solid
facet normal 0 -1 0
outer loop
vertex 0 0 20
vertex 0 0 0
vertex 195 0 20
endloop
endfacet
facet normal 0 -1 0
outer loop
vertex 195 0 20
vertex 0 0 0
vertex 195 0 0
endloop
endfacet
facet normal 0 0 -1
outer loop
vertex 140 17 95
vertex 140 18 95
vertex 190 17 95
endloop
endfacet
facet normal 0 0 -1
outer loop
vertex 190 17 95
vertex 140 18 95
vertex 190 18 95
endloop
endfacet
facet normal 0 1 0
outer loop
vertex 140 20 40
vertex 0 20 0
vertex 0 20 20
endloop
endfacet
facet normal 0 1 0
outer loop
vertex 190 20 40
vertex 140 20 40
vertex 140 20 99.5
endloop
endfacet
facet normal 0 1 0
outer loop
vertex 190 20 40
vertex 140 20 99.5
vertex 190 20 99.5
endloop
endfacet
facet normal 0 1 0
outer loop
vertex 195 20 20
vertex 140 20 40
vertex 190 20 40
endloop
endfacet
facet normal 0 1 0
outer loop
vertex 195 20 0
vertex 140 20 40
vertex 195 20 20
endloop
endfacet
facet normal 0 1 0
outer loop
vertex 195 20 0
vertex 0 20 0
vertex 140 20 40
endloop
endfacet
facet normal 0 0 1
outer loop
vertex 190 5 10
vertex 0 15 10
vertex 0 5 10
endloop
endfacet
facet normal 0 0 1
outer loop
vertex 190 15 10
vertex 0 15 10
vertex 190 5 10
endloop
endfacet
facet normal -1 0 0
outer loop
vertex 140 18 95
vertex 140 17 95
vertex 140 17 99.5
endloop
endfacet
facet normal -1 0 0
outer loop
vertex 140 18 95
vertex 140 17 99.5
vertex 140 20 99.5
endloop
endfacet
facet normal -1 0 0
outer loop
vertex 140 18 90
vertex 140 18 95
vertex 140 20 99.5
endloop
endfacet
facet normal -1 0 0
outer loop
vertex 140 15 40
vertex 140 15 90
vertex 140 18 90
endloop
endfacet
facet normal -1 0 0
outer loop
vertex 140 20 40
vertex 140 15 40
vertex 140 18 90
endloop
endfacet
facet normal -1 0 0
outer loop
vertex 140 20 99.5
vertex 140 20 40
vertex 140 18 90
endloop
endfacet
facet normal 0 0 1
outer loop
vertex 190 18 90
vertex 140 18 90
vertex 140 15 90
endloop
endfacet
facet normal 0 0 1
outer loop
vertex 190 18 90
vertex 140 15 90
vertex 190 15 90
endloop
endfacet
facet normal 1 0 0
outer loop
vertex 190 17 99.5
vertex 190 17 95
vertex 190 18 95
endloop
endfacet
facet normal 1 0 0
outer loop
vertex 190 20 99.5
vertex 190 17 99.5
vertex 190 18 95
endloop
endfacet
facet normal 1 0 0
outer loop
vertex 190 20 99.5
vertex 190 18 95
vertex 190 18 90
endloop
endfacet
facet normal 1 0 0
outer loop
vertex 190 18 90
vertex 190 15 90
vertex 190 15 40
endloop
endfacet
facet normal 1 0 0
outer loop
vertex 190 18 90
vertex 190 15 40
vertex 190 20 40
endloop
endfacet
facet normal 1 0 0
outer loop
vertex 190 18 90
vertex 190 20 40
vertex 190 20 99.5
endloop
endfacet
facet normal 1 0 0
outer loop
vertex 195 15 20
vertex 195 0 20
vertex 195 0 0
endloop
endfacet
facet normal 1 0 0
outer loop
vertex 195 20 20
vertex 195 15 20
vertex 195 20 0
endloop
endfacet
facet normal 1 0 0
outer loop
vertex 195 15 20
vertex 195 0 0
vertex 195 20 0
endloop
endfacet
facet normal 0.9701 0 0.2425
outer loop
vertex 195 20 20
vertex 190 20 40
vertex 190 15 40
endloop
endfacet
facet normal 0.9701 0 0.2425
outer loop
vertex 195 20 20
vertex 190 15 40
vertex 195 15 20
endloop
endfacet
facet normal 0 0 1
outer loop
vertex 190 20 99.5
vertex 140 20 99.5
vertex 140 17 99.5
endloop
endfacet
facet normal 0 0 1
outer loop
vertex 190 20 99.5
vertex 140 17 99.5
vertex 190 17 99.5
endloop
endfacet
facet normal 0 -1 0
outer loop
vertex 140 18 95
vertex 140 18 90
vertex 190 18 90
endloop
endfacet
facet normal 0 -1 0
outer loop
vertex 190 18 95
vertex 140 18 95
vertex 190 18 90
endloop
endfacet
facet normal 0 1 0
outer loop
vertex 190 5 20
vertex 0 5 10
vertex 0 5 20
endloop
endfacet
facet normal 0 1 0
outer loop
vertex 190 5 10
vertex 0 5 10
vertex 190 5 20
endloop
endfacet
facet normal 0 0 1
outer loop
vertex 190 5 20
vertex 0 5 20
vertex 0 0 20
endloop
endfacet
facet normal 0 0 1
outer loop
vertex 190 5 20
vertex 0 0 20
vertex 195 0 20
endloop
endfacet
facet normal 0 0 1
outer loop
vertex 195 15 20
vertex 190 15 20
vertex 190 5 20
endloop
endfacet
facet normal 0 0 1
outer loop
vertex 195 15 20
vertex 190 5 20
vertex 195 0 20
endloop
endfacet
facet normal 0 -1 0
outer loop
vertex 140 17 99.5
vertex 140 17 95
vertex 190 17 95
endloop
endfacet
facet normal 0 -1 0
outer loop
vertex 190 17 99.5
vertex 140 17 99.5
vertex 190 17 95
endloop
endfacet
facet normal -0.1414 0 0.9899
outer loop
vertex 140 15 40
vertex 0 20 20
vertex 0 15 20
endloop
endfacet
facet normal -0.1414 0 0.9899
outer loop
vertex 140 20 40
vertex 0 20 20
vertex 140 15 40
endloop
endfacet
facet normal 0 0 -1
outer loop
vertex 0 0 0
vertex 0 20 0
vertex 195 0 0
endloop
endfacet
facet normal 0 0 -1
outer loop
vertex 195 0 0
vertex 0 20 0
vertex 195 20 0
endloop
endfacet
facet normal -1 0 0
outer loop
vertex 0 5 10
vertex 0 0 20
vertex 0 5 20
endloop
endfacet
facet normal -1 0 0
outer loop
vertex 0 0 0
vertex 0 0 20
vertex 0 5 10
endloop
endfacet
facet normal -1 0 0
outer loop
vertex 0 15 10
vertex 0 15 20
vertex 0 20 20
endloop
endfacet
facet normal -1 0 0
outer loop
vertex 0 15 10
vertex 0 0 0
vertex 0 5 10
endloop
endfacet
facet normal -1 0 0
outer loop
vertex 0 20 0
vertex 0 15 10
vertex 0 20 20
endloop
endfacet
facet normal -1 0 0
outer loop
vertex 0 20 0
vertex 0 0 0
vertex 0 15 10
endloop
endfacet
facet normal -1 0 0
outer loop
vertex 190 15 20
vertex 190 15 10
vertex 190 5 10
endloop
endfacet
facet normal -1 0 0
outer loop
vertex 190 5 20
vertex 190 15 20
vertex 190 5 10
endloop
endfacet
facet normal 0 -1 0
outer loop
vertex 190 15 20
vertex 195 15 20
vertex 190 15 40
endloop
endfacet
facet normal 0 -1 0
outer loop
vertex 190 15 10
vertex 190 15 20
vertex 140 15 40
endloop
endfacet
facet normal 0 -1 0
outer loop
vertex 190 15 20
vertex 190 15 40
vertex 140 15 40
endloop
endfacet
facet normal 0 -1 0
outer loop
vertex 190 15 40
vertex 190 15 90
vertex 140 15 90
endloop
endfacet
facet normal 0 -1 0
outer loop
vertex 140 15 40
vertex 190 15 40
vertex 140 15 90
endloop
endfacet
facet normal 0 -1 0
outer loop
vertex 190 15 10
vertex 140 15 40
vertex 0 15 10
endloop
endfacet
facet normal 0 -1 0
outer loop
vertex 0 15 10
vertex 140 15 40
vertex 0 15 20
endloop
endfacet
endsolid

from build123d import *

# Parameters (mm, degrees)
F0_W      = 190
F0_H      = 5
F1_DEPTH  = 20
F2_W      = 190
F2_H      = 10
F3_DEPTH  = 10
F4_W      = 50
F4_H      = 5
F5_DEPTH  = 70
F7_DEPTH  = 5
F8_W      = 50
F8_H      = 2
F9_DEPTH  = 5
F10_W     = 50
F10_H     = 3
F11_DEPTH = 4.5


with BuildPart() as f1:
    # F0 (on Top) → F1 (new body)
    with BuildSketch(Plane.XY):
        with Locations((95, 2.5)):
            Rectangle(F0_W, F0_H)
        Polygon((190, 5), (190, 0), (195, 0), (195, 20), (190, 20), (190, 15), align=None)
        with Locations((95, 17.5)):
            Rectangle(F0_W, F0_H)
    extrude(amount=F1_DEPTH)

    # F2 (on Top) → F3 (join)
    with BuildSketch(Plane.XY):
        with Locations((95, 10)):
            Rectangle(F2_W, F2_H)
    extrude(amount=F3_DEPTH)

    # F4 (on face) → F5 (join)
    with BuildSketch(Plane.XY.offset(20)):
        with Locations((165, 17.5)):
            Rectangle(F4_W, F4_H)
    extrude(amount=F5_DEPTH)

    # F6 (on face) → F7 (join)
    with BuildSketch(Plane(origin=(0, 20, 0), x_dir=(-1, 0, 0), z_dir=(0, 1, 0))):
        Polygon((-190, 40), (-195, 20), (-190, 20), align=None)
        Polygon((-140, 40), (-140, 20), (0, 20), align=None)
    extrude(amount=-F7_DEPTH)

    # F8 (on face) → F9 (join)
    with BuildSketch(Plane.XY.offset(90)):
        with Locations((165, 19)):
            Rectangle(F8_W, F8_H)
    extrude(amount=F9_DEPTH)

    # F10 (on face) → F11 (join)
    with BuildSketch(Plane.XY.offset(95)):
        with Locations((165, 18.5)):
            Rectangle(F10_W, F10_H)
    extrude(amount=F11_DEPTH)


solid = f1.part
